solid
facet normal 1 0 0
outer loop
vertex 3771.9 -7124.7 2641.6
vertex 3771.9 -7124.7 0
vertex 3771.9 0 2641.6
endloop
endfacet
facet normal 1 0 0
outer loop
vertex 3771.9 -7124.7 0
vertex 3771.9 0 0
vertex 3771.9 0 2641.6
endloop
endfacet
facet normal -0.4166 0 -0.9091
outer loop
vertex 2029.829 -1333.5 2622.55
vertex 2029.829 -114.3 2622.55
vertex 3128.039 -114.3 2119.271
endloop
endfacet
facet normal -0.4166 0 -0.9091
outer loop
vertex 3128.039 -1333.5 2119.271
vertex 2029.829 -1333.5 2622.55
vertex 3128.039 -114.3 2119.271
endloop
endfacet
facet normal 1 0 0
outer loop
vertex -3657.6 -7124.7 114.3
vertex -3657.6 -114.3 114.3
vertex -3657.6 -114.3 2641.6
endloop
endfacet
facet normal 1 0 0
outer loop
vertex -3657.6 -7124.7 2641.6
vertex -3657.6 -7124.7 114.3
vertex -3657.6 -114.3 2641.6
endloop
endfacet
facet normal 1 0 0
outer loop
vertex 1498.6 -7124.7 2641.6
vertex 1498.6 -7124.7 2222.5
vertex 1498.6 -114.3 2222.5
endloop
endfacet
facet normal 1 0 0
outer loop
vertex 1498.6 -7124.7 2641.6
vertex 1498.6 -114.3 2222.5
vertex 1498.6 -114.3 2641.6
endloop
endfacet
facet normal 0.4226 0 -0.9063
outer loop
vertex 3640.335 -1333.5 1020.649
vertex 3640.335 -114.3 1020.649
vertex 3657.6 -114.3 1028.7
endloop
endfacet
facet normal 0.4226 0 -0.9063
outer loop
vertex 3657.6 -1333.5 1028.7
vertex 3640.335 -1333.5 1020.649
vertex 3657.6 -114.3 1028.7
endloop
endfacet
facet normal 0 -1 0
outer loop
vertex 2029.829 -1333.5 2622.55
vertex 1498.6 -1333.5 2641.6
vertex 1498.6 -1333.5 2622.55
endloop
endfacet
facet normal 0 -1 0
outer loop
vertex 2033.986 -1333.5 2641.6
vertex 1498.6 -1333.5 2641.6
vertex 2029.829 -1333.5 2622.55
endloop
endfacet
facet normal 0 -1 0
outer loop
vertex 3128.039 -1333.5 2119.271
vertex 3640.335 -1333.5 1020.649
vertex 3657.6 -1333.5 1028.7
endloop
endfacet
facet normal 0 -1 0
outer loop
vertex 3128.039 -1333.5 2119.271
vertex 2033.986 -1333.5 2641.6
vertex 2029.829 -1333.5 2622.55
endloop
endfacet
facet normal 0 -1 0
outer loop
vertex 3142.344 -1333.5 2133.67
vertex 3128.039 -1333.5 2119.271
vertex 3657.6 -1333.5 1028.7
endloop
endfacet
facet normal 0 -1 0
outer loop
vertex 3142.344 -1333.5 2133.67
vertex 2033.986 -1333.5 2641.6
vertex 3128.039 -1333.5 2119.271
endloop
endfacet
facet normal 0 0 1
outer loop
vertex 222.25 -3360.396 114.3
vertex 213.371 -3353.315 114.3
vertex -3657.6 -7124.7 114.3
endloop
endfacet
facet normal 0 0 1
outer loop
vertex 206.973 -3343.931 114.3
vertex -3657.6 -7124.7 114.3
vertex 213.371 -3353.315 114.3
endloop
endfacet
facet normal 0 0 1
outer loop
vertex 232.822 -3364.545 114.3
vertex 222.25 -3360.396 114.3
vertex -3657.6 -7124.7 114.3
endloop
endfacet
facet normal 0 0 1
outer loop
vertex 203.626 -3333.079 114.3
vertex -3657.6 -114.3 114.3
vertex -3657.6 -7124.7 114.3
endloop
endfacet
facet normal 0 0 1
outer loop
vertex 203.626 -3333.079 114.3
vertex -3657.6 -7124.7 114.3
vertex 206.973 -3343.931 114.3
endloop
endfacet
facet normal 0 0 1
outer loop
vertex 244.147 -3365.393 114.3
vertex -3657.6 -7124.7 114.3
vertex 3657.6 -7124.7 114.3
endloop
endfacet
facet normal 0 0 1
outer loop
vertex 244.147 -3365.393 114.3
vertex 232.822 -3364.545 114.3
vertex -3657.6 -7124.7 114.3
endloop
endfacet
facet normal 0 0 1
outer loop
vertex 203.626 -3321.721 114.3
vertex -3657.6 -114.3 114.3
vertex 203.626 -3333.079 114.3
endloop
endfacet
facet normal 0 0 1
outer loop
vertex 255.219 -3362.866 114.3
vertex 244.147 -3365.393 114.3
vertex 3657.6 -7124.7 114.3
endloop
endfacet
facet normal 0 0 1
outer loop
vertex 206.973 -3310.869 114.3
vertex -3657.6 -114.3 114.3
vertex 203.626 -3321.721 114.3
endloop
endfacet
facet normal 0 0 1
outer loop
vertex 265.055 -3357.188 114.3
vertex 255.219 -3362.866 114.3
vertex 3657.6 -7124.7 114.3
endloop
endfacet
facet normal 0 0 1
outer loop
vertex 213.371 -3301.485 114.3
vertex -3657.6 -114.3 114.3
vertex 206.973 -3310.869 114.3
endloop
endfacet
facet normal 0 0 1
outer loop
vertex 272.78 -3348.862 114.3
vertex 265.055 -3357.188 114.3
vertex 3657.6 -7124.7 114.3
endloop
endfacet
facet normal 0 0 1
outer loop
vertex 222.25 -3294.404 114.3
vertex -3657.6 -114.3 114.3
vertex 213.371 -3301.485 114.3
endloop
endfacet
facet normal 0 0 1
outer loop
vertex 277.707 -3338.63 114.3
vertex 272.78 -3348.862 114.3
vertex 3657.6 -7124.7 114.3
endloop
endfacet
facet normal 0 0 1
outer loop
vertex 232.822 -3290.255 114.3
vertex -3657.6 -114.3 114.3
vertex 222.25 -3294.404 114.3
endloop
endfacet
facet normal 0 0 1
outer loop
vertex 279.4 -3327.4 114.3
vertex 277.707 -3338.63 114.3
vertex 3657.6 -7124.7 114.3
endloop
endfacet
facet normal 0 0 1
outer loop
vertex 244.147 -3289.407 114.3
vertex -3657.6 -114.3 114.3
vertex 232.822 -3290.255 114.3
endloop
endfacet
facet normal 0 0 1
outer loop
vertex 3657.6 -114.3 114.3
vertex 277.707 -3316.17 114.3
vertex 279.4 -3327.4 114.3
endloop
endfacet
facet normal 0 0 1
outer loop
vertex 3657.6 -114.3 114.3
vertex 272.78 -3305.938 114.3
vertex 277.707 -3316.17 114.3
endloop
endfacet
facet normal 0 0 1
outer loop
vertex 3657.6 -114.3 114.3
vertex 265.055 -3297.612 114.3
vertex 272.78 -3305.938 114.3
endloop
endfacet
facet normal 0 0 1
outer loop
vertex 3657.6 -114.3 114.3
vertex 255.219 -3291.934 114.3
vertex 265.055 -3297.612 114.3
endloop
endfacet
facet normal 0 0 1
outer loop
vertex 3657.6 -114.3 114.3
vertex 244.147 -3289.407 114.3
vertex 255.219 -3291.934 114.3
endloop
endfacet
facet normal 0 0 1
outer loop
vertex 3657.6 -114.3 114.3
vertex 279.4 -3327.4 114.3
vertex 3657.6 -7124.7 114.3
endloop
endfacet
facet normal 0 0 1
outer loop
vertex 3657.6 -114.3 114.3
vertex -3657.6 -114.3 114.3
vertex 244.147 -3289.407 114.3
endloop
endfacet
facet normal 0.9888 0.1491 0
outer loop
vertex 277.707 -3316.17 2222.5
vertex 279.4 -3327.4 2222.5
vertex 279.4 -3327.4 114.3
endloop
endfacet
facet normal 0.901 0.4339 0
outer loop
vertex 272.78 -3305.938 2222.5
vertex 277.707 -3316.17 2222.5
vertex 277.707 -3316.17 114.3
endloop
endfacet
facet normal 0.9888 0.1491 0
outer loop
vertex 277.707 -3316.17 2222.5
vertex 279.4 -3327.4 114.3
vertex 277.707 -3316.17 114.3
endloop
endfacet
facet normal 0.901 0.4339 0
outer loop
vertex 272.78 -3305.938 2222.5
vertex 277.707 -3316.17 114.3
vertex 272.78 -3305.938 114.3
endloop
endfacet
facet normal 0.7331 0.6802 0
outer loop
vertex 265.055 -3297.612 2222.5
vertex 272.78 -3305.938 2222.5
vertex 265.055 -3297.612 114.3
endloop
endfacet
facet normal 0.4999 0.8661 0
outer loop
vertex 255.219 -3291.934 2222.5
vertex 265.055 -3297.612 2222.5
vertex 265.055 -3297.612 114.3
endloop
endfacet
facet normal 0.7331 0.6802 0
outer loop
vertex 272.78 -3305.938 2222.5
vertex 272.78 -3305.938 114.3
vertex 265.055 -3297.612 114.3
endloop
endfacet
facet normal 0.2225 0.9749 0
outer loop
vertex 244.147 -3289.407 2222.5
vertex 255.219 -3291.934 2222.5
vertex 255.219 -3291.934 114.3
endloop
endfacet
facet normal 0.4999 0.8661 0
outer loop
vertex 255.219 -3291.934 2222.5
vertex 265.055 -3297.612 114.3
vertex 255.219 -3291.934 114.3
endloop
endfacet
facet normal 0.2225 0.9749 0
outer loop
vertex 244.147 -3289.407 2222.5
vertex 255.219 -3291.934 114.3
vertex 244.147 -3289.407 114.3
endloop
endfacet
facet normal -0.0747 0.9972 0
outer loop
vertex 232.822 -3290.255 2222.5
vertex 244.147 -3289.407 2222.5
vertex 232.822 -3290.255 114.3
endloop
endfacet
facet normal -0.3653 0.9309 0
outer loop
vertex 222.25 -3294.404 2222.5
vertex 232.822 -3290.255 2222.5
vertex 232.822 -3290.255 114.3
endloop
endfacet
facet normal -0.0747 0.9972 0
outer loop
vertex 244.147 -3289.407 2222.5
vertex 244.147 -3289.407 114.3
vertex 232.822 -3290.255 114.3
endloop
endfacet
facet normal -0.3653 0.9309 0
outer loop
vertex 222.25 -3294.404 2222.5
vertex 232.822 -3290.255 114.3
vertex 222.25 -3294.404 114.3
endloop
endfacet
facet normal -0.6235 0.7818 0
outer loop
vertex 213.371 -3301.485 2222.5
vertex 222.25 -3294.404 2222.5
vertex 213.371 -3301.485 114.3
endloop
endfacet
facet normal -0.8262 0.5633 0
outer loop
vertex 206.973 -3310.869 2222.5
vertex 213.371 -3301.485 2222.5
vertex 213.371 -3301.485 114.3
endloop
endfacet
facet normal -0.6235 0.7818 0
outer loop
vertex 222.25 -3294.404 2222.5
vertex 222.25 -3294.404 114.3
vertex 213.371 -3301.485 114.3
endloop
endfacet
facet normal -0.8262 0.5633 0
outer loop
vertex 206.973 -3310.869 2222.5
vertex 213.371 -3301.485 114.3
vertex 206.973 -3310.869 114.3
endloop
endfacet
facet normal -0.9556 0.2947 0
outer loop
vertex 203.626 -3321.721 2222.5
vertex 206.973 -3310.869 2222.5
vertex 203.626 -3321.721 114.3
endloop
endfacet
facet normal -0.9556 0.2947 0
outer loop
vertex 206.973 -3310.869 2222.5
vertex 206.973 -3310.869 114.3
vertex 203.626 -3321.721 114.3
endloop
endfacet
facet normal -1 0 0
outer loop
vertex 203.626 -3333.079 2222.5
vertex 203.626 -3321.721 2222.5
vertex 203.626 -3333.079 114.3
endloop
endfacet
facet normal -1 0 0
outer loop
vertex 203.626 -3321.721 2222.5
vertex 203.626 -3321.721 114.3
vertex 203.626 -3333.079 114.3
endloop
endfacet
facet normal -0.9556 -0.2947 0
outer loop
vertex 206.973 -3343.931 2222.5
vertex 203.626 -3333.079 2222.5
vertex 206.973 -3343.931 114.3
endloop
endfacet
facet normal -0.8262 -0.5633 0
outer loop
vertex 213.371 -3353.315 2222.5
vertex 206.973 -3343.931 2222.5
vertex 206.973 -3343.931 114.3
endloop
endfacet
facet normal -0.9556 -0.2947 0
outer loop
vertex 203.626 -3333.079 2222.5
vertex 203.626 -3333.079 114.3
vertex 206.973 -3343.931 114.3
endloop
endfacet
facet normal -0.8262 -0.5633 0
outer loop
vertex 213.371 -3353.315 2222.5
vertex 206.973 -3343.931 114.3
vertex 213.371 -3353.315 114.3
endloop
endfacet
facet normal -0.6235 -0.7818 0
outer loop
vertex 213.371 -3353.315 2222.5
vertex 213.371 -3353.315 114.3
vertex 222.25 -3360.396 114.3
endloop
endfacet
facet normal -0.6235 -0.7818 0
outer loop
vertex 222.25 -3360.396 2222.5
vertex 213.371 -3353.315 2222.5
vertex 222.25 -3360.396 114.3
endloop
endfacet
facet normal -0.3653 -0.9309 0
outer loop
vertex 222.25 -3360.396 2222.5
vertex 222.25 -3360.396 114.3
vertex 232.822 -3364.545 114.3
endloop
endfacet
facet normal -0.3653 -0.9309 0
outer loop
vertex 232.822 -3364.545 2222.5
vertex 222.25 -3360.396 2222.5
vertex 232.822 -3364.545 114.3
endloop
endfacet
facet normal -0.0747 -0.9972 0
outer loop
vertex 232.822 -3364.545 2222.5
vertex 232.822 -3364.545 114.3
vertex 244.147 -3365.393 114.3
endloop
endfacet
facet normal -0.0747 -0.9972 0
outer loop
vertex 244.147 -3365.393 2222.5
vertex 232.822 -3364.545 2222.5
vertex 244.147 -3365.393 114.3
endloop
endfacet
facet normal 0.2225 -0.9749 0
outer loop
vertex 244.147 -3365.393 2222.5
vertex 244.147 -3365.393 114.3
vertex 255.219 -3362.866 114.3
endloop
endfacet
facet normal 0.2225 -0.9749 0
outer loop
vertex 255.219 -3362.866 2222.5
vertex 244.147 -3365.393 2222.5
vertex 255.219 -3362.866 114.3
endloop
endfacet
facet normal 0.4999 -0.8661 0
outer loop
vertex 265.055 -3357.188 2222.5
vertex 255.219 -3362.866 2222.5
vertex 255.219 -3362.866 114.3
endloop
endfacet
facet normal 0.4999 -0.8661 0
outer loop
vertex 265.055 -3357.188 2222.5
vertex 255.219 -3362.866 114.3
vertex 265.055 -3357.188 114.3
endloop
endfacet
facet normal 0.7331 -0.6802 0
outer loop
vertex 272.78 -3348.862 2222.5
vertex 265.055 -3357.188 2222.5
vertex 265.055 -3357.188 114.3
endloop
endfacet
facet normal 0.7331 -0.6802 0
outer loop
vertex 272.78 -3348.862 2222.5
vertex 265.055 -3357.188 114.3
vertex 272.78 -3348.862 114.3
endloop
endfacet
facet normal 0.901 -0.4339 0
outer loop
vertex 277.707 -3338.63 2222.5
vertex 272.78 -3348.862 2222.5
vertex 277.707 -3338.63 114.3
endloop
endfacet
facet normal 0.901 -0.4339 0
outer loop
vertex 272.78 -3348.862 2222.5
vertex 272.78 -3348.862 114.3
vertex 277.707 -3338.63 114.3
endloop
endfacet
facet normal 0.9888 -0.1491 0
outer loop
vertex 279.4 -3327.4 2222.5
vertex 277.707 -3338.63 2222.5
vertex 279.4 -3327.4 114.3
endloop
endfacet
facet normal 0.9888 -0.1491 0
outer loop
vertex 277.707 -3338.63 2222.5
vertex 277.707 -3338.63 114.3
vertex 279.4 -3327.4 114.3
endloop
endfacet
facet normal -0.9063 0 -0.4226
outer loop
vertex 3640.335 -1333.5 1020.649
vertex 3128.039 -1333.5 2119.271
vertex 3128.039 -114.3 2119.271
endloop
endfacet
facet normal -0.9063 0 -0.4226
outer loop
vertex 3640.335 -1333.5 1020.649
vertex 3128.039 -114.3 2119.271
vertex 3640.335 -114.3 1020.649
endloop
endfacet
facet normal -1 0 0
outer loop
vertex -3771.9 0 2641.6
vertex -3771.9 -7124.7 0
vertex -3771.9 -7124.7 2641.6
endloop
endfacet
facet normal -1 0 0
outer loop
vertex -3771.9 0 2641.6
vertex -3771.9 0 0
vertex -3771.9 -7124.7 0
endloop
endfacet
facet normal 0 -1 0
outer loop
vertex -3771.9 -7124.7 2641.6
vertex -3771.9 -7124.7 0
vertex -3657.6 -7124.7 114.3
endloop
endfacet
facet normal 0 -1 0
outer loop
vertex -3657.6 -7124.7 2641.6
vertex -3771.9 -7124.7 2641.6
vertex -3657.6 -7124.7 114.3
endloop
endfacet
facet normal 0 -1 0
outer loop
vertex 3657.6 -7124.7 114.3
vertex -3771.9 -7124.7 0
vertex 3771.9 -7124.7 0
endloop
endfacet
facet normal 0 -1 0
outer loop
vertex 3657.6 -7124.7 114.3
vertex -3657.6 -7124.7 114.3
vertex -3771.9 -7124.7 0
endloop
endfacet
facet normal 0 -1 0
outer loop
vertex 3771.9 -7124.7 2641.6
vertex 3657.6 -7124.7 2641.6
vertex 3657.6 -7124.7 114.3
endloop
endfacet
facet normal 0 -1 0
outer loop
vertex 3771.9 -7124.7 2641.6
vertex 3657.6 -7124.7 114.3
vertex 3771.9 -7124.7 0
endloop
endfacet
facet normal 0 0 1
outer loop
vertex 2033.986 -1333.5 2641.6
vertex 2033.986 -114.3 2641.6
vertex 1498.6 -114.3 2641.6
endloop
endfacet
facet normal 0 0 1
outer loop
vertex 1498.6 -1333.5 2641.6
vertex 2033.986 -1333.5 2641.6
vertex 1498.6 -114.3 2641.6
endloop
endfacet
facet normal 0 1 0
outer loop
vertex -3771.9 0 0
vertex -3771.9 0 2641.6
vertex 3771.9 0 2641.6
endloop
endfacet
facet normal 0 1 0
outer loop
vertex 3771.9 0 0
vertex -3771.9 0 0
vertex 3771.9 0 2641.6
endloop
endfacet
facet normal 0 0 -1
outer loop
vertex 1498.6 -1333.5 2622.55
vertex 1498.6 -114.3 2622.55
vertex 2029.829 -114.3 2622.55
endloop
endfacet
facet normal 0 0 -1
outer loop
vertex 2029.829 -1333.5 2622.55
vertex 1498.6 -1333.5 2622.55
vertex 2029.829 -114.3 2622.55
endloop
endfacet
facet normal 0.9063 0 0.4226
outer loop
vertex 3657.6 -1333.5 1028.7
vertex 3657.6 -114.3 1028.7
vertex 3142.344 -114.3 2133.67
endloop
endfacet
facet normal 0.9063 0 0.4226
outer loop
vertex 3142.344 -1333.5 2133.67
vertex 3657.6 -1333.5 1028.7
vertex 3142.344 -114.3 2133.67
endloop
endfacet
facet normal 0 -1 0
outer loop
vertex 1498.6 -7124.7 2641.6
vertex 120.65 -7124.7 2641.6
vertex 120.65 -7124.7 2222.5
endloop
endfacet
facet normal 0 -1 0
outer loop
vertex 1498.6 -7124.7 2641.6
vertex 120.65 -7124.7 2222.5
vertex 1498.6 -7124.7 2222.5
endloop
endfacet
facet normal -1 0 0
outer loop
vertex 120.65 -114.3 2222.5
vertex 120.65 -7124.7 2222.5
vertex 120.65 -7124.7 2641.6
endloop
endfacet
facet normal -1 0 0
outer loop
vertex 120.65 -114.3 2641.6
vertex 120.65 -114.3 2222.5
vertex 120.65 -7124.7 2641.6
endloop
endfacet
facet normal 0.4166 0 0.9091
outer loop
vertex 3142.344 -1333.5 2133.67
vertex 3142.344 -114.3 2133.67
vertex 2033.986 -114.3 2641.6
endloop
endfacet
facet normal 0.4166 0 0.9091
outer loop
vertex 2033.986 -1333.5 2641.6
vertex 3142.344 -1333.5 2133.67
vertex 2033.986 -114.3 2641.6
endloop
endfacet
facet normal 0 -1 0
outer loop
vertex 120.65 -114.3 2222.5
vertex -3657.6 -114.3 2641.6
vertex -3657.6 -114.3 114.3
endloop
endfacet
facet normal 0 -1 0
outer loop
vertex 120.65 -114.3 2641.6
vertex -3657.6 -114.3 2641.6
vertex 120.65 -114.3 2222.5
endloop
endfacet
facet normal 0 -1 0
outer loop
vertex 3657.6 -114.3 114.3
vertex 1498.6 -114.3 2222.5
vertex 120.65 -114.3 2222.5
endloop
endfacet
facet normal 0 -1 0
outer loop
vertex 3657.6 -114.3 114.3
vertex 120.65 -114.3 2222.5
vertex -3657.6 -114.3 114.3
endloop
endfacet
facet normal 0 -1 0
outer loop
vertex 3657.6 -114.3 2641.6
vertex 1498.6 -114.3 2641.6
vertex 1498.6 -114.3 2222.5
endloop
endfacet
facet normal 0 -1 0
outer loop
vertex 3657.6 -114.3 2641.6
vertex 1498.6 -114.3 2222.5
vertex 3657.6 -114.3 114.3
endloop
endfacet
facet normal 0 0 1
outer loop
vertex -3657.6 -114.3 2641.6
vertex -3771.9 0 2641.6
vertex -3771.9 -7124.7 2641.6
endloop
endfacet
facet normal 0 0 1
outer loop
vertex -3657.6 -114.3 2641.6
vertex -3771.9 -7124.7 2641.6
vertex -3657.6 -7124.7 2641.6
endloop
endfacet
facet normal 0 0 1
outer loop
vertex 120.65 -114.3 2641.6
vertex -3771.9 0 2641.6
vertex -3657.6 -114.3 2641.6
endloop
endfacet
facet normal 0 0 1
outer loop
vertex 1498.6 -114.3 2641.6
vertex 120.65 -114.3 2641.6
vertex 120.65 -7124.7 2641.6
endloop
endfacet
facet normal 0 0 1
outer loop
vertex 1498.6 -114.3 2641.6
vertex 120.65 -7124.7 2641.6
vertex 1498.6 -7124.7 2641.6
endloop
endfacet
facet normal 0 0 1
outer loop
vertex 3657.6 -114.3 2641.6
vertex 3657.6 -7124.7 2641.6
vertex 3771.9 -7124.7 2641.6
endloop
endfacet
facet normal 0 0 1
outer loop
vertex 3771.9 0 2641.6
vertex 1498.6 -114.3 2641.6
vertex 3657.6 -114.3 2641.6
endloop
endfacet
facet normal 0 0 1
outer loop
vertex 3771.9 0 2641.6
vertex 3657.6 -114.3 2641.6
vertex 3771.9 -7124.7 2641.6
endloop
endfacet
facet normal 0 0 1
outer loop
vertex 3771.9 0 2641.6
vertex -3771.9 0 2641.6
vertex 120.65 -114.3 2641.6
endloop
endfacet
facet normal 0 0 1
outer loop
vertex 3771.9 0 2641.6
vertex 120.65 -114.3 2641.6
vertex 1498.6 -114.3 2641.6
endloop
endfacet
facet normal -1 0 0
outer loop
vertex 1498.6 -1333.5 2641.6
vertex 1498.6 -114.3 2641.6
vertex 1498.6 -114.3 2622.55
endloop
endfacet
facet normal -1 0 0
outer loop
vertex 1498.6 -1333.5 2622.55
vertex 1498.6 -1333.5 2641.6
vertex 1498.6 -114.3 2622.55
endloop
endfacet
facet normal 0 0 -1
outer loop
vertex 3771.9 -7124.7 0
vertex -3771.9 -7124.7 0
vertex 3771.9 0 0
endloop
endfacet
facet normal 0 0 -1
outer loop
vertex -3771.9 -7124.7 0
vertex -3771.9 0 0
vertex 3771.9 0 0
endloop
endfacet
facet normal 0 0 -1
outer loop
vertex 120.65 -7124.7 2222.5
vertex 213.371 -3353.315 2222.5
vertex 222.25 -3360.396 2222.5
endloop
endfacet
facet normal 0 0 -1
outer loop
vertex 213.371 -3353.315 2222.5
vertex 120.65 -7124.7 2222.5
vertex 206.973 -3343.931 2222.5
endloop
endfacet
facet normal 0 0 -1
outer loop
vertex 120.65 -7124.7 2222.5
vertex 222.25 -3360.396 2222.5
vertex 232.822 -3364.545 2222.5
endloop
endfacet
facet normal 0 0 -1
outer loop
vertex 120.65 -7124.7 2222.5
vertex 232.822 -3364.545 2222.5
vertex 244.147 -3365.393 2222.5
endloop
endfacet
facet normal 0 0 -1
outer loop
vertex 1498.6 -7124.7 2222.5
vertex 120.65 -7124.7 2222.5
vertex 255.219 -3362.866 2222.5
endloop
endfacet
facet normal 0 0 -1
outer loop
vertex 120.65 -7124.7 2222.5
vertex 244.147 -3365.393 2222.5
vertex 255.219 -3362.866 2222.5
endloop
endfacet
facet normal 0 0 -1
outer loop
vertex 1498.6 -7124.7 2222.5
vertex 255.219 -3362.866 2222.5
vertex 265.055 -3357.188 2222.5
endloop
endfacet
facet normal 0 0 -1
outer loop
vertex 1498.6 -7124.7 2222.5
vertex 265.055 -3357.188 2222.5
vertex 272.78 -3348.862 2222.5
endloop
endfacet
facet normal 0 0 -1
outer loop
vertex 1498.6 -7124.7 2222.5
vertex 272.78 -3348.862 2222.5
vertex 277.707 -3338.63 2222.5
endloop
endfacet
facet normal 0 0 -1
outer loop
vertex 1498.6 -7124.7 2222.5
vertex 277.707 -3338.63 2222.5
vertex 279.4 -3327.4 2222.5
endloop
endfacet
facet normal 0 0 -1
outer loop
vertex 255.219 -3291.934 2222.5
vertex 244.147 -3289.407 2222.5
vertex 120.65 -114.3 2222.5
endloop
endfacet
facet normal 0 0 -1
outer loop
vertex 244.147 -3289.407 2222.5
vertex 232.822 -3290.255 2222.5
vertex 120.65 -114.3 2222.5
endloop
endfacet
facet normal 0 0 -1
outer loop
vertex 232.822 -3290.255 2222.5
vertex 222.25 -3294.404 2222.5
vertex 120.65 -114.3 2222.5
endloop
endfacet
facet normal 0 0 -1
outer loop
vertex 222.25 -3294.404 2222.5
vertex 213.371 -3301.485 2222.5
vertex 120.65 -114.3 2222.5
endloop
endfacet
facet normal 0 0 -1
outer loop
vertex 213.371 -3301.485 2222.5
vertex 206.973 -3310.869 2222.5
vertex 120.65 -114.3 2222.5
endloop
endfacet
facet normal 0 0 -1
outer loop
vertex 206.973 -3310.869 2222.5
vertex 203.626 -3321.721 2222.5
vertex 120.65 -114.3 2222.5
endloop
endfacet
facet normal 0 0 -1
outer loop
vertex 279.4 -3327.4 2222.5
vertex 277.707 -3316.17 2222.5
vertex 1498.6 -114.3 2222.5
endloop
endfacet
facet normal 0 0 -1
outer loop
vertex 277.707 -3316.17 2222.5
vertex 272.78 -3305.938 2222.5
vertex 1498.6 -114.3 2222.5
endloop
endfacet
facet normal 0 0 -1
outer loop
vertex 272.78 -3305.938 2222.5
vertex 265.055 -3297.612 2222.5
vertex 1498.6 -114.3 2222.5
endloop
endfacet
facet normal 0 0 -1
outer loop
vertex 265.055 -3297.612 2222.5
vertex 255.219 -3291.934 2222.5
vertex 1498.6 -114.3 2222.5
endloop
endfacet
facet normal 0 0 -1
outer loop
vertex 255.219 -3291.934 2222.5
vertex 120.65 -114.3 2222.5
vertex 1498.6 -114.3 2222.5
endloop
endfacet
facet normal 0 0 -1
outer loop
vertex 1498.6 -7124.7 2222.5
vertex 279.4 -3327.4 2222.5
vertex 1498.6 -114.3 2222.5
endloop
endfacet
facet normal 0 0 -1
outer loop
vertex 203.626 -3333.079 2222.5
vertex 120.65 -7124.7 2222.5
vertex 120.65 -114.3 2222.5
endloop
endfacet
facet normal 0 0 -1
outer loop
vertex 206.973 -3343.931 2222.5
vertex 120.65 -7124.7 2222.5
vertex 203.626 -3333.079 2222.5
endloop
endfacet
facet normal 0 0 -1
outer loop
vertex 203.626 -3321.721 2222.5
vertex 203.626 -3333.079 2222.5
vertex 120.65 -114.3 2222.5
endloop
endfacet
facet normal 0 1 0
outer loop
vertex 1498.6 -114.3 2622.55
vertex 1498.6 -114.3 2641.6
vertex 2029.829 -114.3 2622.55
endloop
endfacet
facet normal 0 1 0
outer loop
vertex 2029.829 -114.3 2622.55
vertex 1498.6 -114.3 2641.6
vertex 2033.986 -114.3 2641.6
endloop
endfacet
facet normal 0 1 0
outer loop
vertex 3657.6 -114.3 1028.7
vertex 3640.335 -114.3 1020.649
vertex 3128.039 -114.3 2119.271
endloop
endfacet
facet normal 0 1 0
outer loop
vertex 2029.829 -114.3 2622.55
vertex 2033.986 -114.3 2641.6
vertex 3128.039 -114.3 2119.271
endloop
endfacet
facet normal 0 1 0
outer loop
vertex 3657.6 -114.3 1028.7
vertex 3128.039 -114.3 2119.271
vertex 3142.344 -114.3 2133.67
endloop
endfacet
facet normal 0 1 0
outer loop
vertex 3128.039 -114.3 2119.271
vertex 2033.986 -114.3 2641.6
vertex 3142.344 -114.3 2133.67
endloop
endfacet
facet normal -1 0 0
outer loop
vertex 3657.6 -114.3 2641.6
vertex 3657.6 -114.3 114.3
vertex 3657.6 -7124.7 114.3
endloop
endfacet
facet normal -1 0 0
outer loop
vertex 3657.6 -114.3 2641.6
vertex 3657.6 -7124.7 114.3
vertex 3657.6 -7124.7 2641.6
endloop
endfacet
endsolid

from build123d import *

# Parameters (mm, degrees)
F0_W      = 7543.8
F0_H      = 2641.6
F1_DEPTH  = 114.3
F2_W      = 7543.8
F2_H      = 114.3
F3_W      = 114.3
F3_H      = 2527.3
F4_W      = 114.3
F4_H      = 2527.3
F5_W      = 1377.95
F5_H      = 419.1
F6_DEPTH  = 7010.4
F8_DEPTH  = 1219.2
F9_R      = 38.1
F10_DEPTH = 2108.2


with BuildPart() as f1:
    # F0 (on Front) → F1 (new body)
    with BuildSketch(Plane.XZ):
        with Locations((0, 1320.8)):
            Rectangle(F0_W, F0_H)
    extrude(amount=F1_DEPTH)

    # F2 (on face) + F3 (on face) + F4 (on face) + F5 (on face) → F6 (join)
    with BuildSketch(Plane.XZ.offset(114.3)):
        with Locations((0, 57.15)):
            Rectangle(F2_W, F2_H)
    with BuildSketch(Plane.XZ.offset(114.3)):
        with Locations((3714.75, 1377.95)):
            Rectangle(F3_W, F3_H)
    with BuildSketch(Plane.XZ.offset(114.3)):
        with Locations((-3714.75, 1377.95)):
            Rectangle(F4_W, F4_H)
    with BuildSketch(Plane.XZ.offset(114.3)):
        with Locations((809.625, 2432.05)):
            Rectangle(F5_W, F5_H)
    extrude(amount=F6_DEPTH)

    # F9 (on face) → F10 (join)
    with BuildSketch(Plane.XY.offset(114.3)):
        with Locations((241.3, -3327.4)):
            Circle(F9_R)
    extrude(amount=F10_DEPTH)


with BuildPart() as f8:
    # F7 (on face) → F8 (new body)
    with BuildSketch(Plane.XZ.offset(114.3)):
        Polygon((3657.6, 1028.7), (3142.343815, 2133.670454), (2033.986375, 2641.6), (1498.6, 2641.6), (1498.6, 2622.55), (2029.829202, 2622.55), (3128.039149, 2119.27077), (3640.334837, 1020.649122), align=None)
    extrude(amount=F8_DEPTH)


solid = Compound([f1.part, f8.part])
